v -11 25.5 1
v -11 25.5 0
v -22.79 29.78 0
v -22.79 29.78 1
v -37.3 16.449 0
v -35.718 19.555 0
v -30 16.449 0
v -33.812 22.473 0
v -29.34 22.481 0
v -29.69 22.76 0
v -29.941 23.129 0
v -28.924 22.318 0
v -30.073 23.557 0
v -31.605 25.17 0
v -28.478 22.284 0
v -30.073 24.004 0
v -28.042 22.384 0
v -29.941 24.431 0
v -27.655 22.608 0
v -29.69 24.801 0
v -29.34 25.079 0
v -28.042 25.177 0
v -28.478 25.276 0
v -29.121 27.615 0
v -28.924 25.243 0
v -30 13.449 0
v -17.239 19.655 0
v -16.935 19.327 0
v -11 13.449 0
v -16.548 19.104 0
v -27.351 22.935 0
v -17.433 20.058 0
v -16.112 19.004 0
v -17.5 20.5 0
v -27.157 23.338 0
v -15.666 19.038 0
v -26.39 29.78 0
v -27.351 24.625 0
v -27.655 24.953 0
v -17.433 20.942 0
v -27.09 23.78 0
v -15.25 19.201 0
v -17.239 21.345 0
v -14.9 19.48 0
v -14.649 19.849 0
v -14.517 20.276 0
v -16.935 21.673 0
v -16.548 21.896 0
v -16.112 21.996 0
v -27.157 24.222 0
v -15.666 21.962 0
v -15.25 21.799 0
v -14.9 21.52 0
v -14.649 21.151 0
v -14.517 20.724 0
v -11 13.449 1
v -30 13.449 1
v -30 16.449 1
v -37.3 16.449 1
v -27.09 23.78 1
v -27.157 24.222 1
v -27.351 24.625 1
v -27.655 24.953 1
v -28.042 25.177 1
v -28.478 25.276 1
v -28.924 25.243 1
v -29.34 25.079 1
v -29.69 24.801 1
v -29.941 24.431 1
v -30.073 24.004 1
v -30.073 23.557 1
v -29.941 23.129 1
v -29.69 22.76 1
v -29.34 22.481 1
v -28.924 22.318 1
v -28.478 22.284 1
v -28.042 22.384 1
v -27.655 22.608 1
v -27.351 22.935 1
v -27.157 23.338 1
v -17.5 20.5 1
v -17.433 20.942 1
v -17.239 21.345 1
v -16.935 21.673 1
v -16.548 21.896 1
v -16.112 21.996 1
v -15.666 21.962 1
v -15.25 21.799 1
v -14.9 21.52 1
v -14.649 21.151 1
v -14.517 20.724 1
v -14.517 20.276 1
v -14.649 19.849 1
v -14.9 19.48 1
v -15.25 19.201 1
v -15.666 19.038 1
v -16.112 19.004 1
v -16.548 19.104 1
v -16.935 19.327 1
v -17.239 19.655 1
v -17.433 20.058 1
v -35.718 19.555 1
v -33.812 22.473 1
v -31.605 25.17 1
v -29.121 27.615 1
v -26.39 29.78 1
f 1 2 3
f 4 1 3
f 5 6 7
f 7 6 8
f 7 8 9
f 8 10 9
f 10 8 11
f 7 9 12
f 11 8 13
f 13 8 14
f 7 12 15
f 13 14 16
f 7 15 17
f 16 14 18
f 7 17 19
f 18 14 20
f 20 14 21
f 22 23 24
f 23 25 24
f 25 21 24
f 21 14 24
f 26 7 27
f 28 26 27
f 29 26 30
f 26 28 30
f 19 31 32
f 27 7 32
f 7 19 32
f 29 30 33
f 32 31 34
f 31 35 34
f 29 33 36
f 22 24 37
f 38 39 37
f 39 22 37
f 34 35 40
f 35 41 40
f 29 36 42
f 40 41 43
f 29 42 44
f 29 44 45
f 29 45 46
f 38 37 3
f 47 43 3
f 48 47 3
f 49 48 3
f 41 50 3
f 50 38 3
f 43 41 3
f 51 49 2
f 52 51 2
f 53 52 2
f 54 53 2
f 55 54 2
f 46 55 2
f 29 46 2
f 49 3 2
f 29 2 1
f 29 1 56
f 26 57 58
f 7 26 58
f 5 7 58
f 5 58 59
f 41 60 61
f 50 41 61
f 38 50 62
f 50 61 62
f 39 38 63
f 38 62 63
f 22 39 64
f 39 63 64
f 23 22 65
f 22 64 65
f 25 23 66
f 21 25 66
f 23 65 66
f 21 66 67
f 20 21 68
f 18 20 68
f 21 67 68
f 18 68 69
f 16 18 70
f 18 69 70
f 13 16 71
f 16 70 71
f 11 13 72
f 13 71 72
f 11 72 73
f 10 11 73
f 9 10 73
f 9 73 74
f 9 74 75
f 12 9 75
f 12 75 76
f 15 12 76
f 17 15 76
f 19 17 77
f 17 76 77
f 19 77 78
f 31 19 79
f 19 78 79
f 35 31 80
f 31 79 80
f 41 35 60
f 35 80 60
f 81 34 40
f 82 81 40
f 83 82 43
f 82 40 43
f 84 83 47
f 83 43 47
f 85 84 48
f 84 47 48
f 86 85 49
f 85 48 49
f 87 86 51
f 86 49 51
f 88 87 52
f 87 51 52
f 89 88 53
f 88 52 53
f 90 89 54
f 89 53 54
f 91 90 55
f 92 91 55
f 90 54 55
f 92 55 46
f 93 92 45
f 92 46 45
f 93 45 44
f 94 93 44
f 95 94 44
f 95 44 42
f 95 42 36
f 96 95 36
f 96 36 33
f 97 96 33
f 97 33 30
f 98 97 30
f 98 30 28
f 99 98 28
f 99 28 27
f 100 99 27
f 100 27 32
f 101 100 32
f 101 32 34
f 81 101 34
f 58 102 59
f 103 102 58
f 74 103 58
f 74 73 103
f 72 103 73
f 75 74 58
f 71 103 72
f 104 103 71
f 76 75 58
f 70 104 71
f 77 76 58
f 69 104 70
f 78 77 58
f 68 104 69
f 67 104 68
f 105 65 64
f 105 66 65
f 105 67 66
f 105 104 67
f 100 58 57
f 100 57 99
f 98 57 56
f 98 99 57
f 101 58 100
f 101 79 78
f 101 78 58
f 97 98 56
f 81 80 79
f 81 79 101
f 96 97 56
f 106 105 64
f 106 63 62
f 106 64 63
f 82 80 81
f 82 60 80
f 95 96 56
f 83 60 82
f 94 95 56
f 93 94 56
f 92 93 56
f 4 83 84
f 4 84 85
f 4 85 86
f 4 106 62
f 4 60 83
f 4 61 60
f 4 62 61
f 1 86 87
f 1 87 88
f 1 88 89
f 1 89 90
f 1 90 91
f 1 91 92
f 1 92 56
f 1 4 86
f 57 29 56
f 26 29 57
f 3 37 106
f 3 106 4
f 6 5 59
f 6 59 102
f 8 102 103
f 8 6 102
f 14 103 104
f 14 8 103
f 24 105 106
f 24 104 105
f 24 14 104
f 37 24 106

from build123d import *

# Parameters (mm, degrees)
BOSS_EXTRUDE1_DEPTH = 3
SKETCH2_R           = 1.5
CUT_EXTRUDE3_DEPTH  = 3
CUT_EXTRUDE4_START  = -10
CUT_EXTRUDE4_DEPTH  = 10
BOSS_EXTRUDE2_START = -3
BOSS_EXTRUDE2_DEPTH = 3
SKETCH5_W           = 0.56
SKETCH5_H           = 32.898596714
CUT_EXTRUDE5_DEPTH  = 3
SKETCH6_W           = 0.2
SKETCH6_H           = 32.898596714
CUT_EXTRUDE6_DEPTH  = 3
SKETCH7_R           = 2
CUT_EXTRUDE8_DEPTH  = 3
BOSS_EXTRUDE3_START = -3
BOSS_EXTRUDE3_DEPTH = 3
CUT_EXTRUDE9_START  = -3
CUT_EXTRUDE9_DEPTH  = 3
BOSS_EXTRUDE5_START = -3
BOSS_EXTRUDE5_DEPTH = 3
CUT_EXTRUDE10_START = -2
CUT_EXTRUDE10_DEPTH = 2
CUT_EXTRUDE11_START = -3
CUT_EXTRUDE11_DEPTH = 3
SKETCH13_R          = 1.5
CUT_EXTRUDE12_DEPTH = 1
CUT_EXTRUDE13_DEPTH = 1
SKETCH16_R          = 1.5
CUT_EXTRUDE16_DEPTH = 10


with BuildPart() as part:
    # Sketch1 → Boss-Extrude1 (new body)
    with BuildSketch(Plane.XY):
        with BuildLine():
            Line((-11, 25.5), (-22.790038711, 29.780264196))
            ThreePointArc((-22.790038711, 29.780264196), (0, -37.5), (22.790038711, 29.780264196))
            Line((22.790038711, 29.780264196), (11, 25.5))
            Line((11, 25.5), (-11, 25.5))
        make_face()
    extrude(amount=BOSS_EXTRUDE1_DEPTH)

    # Sketch2 → Cut-Extrude3 (cut)
    with BuildSketch(Plane.XY.offset(3)):
        with Locations((-25.400000001, 10.496905453)):
            Circle(SKETCH2_R)
        with Locations((-25.399981845, -10.493094547)):
            Circle(SKETCH2_R)
        with Locations(Location((25.399981845, -10.493094547, 0), (0, 0, 180))):
            Circle(SKETCH2_R)
        with Locations(Location((25.400000001, 10.496905453, 0), (0, 0, 180))):
            Circle(SKETCH2_R)
    extrude(amount=-CUT_EXTRUDE3_DEPTH, mode=Mode.SUBTRACT)

    # Sketch3 → Cut-Extrude4 (cut)
    with BuildSketch(Plane.XY.offset(3).offset(CUT_EXTRUDE4_START)):
        with BuildLine():
            Line((-30.76, 21.449298357), (-30.76, -21.449298357))
            ThreePointArc((-30.76, -21.449298357), (-37.5, 0), (-30.76, 21.449298357))
        make_face()
        with BuildLine():
            Line((30.76, 21.449298357), (30.76, -21.449298357))
            ThreePointArc((30.76, -21.449298357), (37.5, 0), (30.76, 21.449298357))
        make_face()
    extrude(amount=CUT_EXTRUDE4_DEPTH, mode=Mode.SUBTRACT)

    # Sketch4 → Boss-Extrude2 (add)
    with BuildSketch(Plane.XY.offset(3).offset(BOSS_EXTRUDE2_START)):
        with BuildLine():
            Line((-30.76, -21.449298357), (-30.76, -16.449298357))
            Line((-30.76, -16.449298357), (-33.699711921, -16.449298357))
            ThreePointArc((-33.699711921, -16.449298357), (-32.32667034, -19.006219634), (-30.76, -21.449298357))
        make_face()
        with BuildLine():
            Line((-33.699711921, 16.449298357), (-30.76, 16.449298357))
            Line((-30.76, 16.449298357), (-30.76, 21.449298357))
            ThreePointArc((-30.76, 21.449298357), (-32.32667034, 19.006219634), (-33.699711921, 16.449298357))
        make_face()
        with BuildLine():
            Line((30.76, 21.449298357), (30.76, 16.449298357))
            Line((30.76, 16.449298357), (33.699711921, 16.449298357))
            ThreePointArc((33.699711921, 16.449298357), (32.32667034, 19.006219634), (30.76, 21.449298357))
        make_face()
        with BuildLine():
            Line((30.76, -16.449298357), (30.76, -21.449298357))
            ThreePointArc((30.76, -21.449298357), (32.32667034, -19.006219634), (33.699711921, -16.449298357))
            Line((33.699711921, -16.449298357), (30.76, -16.449298357))
        make_face()
    extrude(amount=BOSS_EXTRUDE2_DEPTH)

    # Sketch5 → Cut-Extrude5 (cut)
    with BuildSketch(Plane.XY.offset(3)):
        with Locations((-30.48, 0)):
            Rectangle(SKETCH5_W, SKETCH5_H)
        with Locations((30.48, 0)):
            Rectangle(SKETCH5_W, SKETCH5_H)
    extrude(amount=-CUT_EXTRUDE5_DEPTH, mode=Mode.SUBTRACT)

    # Sketch6 → Cut-Extrude6 (cut)
    with BuildSketch(Plane.XY.offset(3)):
        with Locations((-30.1, 0)):
            Rectangle(SKETCH6_W, SKETCH6_H)
        with Locations((30.1, 0)):
            Rectangle(SKETCH6_W, SKETCH6_H)
    extrude(amount=-CUT_EXTRUDE6_DEPTH, mode=Mode.SUBTRACT)

    # Sketch7 → Cut-Extrude8 (cut)
    with BuildSketch(Plane.XY.offset(3)):
        with Locations((-19.15, -21.55)):
            Circle(SKETCH7_R)
        with Locations(Location((19.15, -21.55, 0), (0, 0, 180))):
            Circle(SKETCH7_R)
    extrude(amount=-CUT_EXTRUDE8_DEPTH, mode=Mode.SUBTRACT)

    # Sketch8 → Boss-Extrude3 (add)
    with BuildSketch(Plane.XY.offset(3).offset(BOSS_EXTRUDE3_START)):
        with BuildLine():
            Line((-33.699711921, 16.449298357), (-37.299711921, 16.449298357))
            ThreePointArc((-37.299711921, 16.449298357), (-32.744884003, 23.851322108), (-26.390038711, 29.780264196))
            Line((-26.390038711, 29.780264196), (-22.790038711, 29.780264196))
            ThreePointArc((-22.790038711, 29.780264196), (-29.020710607, 23.749702226), (-33.699711921, 16.449298357))
        make_face()
        with BuildLine():
            Line((33.699711921, 16.449298357), (37.299711921, 16.449298357))
            ThreePointArc((37.299711921, 16.449298357), (32.744884003, 23.851322108), (26.390038711, 29.780264196))
            Line((26.390038711, 29.780264196), (22.790038711, 29.780264196))
            ThreePointArc((22.790038711, 29.780264196), (29.020710607, 23.749702226), (33.699711921, 16.449298357))
        make_face()
    extrude(amount=BOSS_EXTRUDE3_DEPTH)

    # Sketch9 → Cut-Extrude9 (cut)
    with BuildSketch(Plane.XY.offset(3).offset(CUT_EXTRUDE9_START)):
        with BuildLine():
            Line((4.733920151, -37.2), (-4.733920151, -37.2))
            ThreePointArc((-4.733920151, -37.2), (0, -37.5), (4.733920151, -37.2))
        make_face()
    extrude(amount=CUT_EXTRUDE9_DEPTH, mode=Mode.SUBTRACT)

    # Sketch10 → Boss-Extrude5 (add)
    with BuildSketch(Plane.XY.offset(3).offset(BOSS_EXTRUDE5_START)):
        with BuildLine():
            ThreePointArc((-4.733920151, -37.2), (-21.838816892, -30.484685938), (-33.699711921, -16.449298357))
            Line((-33.699711921, -16.449298357), (-37.299711921, -16.449298357))
            ThreePointArc((-37.299711921, -16.449298357), (-23.43831182, -30.624902723), (-4.733920151, -37.2))
        make_face()
        with BuildLine():
            ThreePointArc((33.699711921, -16.449298357), (21.838816892, -30.484685938), (4.733920151, -37.2))
            ThreePointArc((4.733920151, -37.2), (23.43831182, -30.624902723), (37.299711921, -16.449298357))
            Line((37.299711921, -16.449298357), (33.699711921, -16.449298357))
        make_face()
        with BuildLine():
            Line((4.733920151, -37.2), (-4.733920151, -37.2))
            ThreePointArc((-4.733920151, -37.2), (0, -37.457659609), (4.733920151, -37.2))
        make_face()
    extrude(amount=BOSS_EXTRUDE5_DEPTH)

    # Sketch11 → Cut-Extrude10 (cut)
    with BuildSketch(Plane.XY.offset(3).offset(CUT_EXTRUDE10_START)):
        with BuildLine():
            Line((-30, 16.449298357), (-30, 13.449298357))
            Line((-30, 13.449298357), (30, 13.449298357))
            Line((30, 13.449298357), (30, 16.449298357))
            Line((30, 16.449298357), (37.299711921, 16.449298357))
            ThreePointArc((37.299711921, 16.449298357), (32.744884003, 23.851322108), (26.390038711, 29.780264196))
            Line((26.390038711, 29.780264196), (22.790038711, 29.780264196))
            Line((22.790038711, 29.780264196), (11, 25.5))
            Line((11, 25.5), (-11, 25.5))
            Line((-11, 25.5), (-22.790038711, 29.780264196))
            Line((-22.790038711, 29.780264196), (-26.390038711, 29.780264196))
            ThreePointArc((-26.390038711, 29.780264196), (-32.744884003, 23.851322108), (-37.299711921, 16.449298357))
            Line((-37.299711921, 16.449298357), (-30, 16.449298357))
        make_face()
    extrude(amount=CUT_EXTRUDE10_DEPTH, mode=Mode.SUBTRACT)

    # Sketch12 → Cut-Extrude11 (cut)
    with BuildSketch(Plane.XY.offset(3).offset(CUT_EXTRUDE11_START)):
        with BuildLine():
            Line((-30, 13.449298357), (-30, -16.449298357))
            Line((-30, -16.449298357), (-37.299711921, -16.449298357))
            ThreePointArc((-37.299711921, -16.449298357), (0, -37.457659609), (37.299711921, -16.449298357))
            Line((37.299711921, -16.449298357), (30, -16.449298357))
            Line((30, -16.449298357), (30, 13.449298357))
            Line((30, 13.449298357), (-30, 13.449298357))
        make_face()
    extrude(amount=CUT_EXTRUDE11_DEPTH, mode=Mode.SUBTRACT)

    # Sketch13 → Cut-Extrude12 (cut)
    with BuildSketch(Plane.XY.offset(1)):
        with Locations((-28.590038711, 23.780264196)):
            Circle(SKETCH13_R)
        with Locations(Location((28.590038711, 23.780264196, 0), (0, 0, 180))):
            Circle(SKETCH13_R)
    extrude(amount=-CUT_EXTRUDE12_DEPTH, mode=Mode.SUBTRACT)

    # Sketch14 → Cut-Extrude13 (cut)
    with BuildSketch(Plane(origin=(0, 0, 0), x_dir=(-1, 0, 0), z_dir=(0, 0, -1))):
        Polygon((11, 25.5), (11, 13.449298357), (-37.921130539, 13.449298357), (-37.921130539, 32.14037145), (-13.46056527, 32.14037145), (-11, 25.5), align=None)
    extrude(amount=-CUT_EXTRUDE13_DEPTH, mode=Mode.SUBTRACT)

    # Sketch16 → Cut-Extrude16 (cut)
    with BuildSketch(Plane(origin=(0, 0, 0), x_dir=(-1, 0, 0), z_dir=(0, 0, -1))):
        with Locations((16, 20.5)):
            Circle(SKETCH16_R)
    extrude(amount=-CUT_EXTRUDE16_DEPTH, mode=Mode.SUBTRACT)


solid = part.part
